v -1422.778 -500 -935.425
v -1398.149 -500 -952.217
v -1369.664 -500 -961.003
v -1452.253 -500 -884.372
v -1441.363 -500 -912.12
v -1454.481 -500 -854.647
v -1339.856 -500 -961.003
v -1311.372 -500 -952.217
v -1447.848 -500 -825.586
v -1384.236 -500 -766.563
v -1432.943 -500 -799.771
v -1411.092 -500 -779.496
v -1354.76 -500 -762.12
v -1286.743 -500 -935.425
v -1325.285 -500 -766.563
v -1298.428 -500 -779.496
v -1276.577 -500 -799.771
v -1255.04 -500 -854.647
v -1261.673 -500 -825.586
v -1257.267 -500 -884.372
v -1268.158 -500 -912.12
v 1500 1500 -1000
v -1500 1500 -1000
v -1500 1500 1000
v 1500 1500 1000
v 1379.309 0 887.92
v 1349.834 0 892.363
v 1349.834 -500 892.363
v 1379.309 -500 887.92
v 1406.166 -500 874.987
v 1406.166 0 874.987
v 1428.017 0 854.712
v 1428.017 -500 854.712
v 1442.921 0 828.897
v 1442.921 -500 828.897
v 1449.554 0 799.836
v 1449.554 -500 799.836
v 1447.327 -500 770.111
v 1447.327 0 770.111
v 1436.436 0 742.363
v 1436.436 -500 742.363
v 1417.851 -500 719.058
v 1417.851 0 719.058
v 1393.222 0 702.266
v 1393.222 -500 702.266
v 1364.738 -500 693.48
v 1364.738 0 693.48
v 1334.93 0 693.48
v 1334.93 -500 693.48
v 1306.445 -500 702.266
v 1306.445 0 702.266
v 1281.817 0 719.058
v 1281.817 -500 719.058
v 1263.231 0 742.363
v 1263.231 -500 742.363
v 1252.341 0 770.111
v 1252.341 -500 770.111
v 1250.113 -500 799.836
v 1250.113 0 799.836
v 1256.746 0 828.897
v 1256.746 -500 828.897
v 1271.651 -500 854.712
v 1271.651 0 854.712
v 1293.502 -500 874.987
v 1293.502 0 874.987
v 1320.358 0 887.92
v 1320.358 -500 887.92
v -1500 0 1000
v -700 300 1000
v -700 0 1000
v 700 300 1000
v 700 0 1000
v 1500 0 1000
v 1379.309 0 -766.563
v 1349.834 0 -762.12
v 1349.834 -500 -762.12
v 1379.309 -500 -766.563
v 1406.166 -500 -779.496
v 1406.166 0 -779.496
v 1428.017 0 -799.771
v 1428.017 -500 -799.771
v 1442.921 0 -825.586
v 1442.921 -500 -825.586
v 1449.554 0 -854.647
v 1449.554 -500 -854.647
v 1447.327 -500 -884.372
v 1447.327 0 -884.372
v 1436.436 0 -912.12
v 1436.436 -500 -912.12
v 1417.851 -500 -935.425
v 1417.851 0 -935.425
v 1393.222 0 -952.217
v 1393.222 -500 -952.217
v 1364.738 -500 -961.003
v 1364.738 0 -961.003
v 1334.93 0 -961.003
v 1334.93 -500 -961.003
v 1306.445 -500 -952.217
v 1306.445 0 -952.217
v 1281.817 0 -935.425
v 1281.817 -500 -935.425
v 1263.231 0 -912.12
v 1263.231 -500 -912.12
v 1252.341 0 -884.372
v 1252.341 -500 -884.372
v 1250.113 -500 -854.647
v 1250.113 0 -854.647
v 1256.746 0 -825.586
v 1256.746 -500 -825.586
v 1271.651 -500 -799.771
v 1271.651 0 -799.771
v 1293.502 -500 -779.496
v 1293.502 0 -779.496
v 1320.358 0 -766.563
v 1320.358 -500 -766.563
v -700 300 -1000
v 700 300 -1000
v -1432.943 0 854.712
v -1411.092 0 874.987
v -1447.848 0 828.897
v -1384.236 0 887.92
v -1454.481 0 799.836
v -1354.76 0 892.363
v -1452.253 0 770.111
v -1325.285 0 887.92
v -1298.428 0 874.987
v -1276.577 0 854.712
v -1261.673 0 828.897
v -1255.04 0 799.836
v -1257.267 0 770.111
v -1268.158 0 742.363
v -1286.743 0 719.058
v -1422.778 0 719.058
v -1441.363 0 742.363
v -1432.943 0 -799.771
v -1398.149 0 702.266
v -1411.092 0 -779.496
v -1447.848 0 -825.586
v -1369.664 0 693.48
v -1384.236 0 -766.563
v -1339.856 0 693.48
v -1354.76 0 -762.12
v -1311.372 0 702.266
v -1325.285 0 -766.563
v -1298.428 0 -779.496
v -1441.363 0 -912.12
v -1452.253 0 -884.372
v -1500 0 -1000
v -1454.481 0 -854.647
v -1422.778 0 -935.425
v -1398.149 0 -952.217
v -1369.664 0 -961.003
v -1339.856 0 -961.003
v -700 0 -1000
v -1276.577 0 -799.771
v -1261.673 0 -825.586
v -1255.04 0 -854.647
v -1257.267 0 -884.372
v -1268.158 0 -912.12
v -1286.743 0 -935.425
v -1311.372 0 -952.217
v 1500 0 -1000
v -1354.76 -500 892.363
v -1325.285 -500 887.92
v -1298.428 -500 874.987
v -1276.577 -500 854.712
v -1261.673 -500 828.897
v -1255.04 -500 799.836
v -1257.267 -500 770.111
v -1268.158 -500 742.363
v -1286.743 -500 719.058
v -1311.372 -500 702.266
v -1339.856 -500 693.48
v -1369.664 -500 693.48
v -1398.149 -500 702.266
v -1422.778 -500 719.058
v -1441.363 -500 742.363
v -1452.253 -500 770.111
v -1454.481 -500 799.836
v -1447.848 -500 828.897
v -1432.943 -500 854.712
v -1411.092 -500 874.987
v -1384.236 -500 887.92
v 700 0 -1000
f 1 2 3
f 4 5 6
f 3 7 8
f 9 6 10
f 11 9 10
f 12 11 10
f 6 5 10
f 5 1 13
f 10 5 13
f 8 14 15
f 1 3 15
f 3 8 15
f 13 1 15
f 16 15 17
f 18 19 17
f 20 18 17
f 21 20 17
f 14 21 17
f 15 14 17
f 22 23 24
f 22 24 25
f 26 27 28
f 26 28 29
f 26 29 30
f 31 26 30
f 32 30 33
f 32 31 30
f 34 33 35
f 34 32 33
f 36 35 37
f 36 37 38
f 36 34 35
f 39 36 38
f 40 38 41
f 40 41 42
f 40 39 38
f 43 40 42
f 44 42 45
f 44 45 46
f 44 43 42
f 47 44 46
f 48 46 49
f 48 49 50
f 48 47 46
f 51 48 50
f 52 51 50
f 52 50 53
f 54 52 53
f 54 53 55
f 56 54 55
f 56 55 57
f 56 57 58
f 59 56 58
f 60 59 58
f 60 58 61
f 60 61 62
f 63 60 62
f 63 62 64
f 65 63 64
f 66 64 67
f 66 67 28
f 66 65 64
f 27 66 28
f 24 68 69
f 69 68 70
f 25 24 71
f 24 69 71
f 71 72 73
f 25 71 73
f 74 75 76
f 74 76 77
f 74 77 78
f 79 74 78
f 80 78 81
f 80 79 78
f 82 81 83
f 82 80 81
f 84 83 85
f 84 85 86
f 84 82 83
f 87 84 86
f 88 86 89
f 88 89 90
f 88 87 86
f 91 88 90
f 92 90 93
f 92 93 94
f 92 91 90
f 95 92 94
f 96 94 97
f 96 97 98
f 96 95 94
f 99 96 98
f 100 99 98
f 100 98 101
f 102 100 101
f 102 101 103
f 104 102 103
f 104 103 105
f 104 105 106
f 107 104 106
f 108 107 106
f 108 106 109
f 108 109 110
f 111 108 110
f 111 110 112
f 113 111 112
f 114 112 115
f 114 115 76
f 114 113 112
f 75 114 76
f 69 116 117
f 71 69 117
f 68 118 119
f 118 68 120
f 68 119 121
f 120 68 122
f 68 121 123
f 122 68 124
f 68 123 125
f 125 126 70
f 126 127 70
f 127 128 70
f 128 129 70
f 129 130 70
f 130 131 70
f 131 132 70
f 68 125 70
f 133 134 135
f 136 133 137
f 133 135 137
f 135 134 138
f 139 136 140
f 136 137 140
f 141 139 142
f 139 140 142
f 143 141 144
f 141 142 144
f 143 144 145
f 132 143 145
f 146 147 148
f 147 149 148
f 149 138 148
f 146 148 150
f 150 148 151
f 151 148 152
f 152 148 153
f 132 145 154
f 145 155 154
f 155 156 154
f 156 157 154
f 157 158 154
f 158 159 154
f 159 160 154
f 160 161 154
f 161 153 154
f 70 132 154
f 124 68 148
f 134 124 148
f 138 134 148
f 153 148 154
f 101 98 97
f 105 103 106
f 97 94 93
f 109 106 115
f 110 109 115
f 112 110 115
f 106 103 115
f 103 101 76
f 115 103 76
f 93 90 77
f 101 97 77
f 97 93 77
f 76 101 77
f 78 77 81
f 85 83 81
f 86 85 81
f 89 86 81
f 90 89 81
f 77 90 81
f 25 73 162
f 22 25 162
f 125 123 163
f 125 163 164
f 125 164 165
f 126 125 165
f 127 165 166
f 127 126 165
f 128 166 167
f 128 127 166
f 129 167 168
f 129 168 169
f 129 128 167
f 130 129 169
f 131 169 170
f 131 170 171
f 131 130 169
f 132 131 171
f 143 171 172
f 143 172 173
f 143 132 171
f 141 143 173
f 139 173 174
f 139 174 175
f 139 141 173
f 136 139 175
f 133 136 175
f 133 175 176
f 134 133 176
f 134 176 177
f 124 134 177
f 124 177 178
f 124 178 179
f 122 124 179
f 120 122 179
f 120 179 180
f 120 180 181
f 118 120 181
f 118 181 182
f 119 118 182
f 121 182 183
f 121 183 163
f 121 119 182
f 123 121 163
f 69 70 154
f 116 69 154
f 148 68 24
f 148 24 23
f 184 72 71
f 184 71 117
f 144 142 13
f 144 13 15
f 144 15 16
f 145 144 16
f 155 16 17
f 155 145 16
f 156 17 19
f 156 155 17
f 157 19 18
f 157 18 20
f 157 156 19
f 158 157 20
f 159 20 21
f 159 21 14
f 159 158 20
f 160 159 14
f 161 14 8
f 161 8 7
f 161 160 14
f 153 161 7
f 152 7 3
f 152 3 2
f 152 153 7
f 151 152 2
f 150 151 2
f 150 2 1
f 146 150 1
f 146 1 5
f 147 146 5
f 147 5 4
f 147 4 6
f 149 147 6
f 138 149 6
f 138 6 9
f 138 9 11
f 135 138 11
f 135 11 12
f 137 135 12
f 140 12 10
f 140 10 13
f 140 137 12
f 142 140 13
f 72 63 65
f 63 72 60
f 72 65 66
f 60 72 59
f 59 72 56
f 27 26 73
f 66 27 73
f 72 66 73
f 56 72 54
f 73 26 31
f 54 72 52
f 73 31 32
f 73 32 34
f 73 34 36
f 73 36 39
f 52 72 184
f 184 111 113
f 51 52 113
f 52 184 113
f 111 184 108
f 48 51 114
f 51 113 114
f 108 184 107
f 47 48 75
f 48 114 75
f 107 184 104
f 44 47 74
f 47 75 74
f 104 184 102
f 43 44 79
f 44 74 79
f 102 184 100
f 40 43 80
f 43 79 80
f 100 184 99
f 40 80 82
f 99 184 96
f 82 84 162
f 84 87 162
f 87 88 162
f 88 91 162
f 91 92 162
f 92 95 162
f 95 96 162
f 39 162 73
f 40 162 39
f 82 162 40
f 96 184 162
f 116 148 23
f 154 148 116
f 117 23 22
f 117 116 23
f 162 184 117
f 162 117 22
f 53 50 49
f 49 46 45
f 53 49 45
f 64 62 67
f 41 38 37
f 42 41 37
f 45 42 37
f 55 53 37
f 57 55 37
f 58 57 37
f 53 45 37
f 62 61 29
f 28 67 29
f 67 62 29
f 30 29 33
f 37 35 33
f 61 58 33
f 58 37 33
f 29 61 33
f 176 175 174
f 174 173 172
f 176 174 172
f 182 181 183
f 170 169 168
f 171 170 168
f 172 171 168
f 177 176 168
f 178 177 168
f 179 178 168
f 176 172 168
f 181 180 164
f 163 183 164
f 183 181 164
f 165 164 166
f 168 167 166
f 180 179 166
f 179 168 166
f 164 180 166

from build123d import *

# Parameters (mm, degrees)
SKETCH1_W           = 3000
SKETCH1_H           = 2000
BOSS_EXTRUDE1_DEPTH = 1500
SKETCH2_W           = 1400
SKETCH2_H           = 2400
CUT_EXTRUDE2_DEPTH  = 300
SKETCH3_R           = 100
BOSS_EXTRUDE2_DEPTH = 500


with BuildPart() as part:
    # Sketch1 → Boss-Extrude1 (new body)
    with BuildSketch(Plane(origin=(0, 0, 0), x_dir=(1, 0, 0), z_dir=(0, 1, 0))):
        Rectangle(SKETCH1_W, SKETCH1_H)
    extrude(amount=BOSS_EXTRUDE1_DEPTH)

    # Sketch2 → Cut-Extrude2 (cut)
    with BuildSketch(Plane(origin=(0, 0, 0), x_dir=(1, 0, 0), z_dir=(0, 1, 0))):
        Rectangle(SKETCH2_W, SKETCH2_H)
    extrude(amount=CUT_EXTRUDE2_DEPTH, mode=Mode.SUBTRACT)

    # Sketch3 → Boss-Extrude2 (add)
    with BuildSketch(Plane(origin=(0, 0, 0), x_dir=(1, 0, 0), z_dir=(0, 1, 0))):
        with Locations(Location((-1354.760271255, 862.120172617, 0), (0, 0, 270))):
            Circle(SKETCH3_R)
        with Locations(Location((1349.833870269, 862.120172617, 0), (0, 0, 270))):
            Circle(SKETCH3_R)
        with Locations(Location((1349.833870269, -792.363091909, 0), (0, 0, 270))):
            Circle(SKETCH3_R)
        with Locations(Location((-1354.760271255, -792.363091909, 0), (0, 0, 270))):
            Circle(SKETCH3_R)
    extrude(amount=-BOSS_EXTRUDE2_DEPTH)


solid = part.part
